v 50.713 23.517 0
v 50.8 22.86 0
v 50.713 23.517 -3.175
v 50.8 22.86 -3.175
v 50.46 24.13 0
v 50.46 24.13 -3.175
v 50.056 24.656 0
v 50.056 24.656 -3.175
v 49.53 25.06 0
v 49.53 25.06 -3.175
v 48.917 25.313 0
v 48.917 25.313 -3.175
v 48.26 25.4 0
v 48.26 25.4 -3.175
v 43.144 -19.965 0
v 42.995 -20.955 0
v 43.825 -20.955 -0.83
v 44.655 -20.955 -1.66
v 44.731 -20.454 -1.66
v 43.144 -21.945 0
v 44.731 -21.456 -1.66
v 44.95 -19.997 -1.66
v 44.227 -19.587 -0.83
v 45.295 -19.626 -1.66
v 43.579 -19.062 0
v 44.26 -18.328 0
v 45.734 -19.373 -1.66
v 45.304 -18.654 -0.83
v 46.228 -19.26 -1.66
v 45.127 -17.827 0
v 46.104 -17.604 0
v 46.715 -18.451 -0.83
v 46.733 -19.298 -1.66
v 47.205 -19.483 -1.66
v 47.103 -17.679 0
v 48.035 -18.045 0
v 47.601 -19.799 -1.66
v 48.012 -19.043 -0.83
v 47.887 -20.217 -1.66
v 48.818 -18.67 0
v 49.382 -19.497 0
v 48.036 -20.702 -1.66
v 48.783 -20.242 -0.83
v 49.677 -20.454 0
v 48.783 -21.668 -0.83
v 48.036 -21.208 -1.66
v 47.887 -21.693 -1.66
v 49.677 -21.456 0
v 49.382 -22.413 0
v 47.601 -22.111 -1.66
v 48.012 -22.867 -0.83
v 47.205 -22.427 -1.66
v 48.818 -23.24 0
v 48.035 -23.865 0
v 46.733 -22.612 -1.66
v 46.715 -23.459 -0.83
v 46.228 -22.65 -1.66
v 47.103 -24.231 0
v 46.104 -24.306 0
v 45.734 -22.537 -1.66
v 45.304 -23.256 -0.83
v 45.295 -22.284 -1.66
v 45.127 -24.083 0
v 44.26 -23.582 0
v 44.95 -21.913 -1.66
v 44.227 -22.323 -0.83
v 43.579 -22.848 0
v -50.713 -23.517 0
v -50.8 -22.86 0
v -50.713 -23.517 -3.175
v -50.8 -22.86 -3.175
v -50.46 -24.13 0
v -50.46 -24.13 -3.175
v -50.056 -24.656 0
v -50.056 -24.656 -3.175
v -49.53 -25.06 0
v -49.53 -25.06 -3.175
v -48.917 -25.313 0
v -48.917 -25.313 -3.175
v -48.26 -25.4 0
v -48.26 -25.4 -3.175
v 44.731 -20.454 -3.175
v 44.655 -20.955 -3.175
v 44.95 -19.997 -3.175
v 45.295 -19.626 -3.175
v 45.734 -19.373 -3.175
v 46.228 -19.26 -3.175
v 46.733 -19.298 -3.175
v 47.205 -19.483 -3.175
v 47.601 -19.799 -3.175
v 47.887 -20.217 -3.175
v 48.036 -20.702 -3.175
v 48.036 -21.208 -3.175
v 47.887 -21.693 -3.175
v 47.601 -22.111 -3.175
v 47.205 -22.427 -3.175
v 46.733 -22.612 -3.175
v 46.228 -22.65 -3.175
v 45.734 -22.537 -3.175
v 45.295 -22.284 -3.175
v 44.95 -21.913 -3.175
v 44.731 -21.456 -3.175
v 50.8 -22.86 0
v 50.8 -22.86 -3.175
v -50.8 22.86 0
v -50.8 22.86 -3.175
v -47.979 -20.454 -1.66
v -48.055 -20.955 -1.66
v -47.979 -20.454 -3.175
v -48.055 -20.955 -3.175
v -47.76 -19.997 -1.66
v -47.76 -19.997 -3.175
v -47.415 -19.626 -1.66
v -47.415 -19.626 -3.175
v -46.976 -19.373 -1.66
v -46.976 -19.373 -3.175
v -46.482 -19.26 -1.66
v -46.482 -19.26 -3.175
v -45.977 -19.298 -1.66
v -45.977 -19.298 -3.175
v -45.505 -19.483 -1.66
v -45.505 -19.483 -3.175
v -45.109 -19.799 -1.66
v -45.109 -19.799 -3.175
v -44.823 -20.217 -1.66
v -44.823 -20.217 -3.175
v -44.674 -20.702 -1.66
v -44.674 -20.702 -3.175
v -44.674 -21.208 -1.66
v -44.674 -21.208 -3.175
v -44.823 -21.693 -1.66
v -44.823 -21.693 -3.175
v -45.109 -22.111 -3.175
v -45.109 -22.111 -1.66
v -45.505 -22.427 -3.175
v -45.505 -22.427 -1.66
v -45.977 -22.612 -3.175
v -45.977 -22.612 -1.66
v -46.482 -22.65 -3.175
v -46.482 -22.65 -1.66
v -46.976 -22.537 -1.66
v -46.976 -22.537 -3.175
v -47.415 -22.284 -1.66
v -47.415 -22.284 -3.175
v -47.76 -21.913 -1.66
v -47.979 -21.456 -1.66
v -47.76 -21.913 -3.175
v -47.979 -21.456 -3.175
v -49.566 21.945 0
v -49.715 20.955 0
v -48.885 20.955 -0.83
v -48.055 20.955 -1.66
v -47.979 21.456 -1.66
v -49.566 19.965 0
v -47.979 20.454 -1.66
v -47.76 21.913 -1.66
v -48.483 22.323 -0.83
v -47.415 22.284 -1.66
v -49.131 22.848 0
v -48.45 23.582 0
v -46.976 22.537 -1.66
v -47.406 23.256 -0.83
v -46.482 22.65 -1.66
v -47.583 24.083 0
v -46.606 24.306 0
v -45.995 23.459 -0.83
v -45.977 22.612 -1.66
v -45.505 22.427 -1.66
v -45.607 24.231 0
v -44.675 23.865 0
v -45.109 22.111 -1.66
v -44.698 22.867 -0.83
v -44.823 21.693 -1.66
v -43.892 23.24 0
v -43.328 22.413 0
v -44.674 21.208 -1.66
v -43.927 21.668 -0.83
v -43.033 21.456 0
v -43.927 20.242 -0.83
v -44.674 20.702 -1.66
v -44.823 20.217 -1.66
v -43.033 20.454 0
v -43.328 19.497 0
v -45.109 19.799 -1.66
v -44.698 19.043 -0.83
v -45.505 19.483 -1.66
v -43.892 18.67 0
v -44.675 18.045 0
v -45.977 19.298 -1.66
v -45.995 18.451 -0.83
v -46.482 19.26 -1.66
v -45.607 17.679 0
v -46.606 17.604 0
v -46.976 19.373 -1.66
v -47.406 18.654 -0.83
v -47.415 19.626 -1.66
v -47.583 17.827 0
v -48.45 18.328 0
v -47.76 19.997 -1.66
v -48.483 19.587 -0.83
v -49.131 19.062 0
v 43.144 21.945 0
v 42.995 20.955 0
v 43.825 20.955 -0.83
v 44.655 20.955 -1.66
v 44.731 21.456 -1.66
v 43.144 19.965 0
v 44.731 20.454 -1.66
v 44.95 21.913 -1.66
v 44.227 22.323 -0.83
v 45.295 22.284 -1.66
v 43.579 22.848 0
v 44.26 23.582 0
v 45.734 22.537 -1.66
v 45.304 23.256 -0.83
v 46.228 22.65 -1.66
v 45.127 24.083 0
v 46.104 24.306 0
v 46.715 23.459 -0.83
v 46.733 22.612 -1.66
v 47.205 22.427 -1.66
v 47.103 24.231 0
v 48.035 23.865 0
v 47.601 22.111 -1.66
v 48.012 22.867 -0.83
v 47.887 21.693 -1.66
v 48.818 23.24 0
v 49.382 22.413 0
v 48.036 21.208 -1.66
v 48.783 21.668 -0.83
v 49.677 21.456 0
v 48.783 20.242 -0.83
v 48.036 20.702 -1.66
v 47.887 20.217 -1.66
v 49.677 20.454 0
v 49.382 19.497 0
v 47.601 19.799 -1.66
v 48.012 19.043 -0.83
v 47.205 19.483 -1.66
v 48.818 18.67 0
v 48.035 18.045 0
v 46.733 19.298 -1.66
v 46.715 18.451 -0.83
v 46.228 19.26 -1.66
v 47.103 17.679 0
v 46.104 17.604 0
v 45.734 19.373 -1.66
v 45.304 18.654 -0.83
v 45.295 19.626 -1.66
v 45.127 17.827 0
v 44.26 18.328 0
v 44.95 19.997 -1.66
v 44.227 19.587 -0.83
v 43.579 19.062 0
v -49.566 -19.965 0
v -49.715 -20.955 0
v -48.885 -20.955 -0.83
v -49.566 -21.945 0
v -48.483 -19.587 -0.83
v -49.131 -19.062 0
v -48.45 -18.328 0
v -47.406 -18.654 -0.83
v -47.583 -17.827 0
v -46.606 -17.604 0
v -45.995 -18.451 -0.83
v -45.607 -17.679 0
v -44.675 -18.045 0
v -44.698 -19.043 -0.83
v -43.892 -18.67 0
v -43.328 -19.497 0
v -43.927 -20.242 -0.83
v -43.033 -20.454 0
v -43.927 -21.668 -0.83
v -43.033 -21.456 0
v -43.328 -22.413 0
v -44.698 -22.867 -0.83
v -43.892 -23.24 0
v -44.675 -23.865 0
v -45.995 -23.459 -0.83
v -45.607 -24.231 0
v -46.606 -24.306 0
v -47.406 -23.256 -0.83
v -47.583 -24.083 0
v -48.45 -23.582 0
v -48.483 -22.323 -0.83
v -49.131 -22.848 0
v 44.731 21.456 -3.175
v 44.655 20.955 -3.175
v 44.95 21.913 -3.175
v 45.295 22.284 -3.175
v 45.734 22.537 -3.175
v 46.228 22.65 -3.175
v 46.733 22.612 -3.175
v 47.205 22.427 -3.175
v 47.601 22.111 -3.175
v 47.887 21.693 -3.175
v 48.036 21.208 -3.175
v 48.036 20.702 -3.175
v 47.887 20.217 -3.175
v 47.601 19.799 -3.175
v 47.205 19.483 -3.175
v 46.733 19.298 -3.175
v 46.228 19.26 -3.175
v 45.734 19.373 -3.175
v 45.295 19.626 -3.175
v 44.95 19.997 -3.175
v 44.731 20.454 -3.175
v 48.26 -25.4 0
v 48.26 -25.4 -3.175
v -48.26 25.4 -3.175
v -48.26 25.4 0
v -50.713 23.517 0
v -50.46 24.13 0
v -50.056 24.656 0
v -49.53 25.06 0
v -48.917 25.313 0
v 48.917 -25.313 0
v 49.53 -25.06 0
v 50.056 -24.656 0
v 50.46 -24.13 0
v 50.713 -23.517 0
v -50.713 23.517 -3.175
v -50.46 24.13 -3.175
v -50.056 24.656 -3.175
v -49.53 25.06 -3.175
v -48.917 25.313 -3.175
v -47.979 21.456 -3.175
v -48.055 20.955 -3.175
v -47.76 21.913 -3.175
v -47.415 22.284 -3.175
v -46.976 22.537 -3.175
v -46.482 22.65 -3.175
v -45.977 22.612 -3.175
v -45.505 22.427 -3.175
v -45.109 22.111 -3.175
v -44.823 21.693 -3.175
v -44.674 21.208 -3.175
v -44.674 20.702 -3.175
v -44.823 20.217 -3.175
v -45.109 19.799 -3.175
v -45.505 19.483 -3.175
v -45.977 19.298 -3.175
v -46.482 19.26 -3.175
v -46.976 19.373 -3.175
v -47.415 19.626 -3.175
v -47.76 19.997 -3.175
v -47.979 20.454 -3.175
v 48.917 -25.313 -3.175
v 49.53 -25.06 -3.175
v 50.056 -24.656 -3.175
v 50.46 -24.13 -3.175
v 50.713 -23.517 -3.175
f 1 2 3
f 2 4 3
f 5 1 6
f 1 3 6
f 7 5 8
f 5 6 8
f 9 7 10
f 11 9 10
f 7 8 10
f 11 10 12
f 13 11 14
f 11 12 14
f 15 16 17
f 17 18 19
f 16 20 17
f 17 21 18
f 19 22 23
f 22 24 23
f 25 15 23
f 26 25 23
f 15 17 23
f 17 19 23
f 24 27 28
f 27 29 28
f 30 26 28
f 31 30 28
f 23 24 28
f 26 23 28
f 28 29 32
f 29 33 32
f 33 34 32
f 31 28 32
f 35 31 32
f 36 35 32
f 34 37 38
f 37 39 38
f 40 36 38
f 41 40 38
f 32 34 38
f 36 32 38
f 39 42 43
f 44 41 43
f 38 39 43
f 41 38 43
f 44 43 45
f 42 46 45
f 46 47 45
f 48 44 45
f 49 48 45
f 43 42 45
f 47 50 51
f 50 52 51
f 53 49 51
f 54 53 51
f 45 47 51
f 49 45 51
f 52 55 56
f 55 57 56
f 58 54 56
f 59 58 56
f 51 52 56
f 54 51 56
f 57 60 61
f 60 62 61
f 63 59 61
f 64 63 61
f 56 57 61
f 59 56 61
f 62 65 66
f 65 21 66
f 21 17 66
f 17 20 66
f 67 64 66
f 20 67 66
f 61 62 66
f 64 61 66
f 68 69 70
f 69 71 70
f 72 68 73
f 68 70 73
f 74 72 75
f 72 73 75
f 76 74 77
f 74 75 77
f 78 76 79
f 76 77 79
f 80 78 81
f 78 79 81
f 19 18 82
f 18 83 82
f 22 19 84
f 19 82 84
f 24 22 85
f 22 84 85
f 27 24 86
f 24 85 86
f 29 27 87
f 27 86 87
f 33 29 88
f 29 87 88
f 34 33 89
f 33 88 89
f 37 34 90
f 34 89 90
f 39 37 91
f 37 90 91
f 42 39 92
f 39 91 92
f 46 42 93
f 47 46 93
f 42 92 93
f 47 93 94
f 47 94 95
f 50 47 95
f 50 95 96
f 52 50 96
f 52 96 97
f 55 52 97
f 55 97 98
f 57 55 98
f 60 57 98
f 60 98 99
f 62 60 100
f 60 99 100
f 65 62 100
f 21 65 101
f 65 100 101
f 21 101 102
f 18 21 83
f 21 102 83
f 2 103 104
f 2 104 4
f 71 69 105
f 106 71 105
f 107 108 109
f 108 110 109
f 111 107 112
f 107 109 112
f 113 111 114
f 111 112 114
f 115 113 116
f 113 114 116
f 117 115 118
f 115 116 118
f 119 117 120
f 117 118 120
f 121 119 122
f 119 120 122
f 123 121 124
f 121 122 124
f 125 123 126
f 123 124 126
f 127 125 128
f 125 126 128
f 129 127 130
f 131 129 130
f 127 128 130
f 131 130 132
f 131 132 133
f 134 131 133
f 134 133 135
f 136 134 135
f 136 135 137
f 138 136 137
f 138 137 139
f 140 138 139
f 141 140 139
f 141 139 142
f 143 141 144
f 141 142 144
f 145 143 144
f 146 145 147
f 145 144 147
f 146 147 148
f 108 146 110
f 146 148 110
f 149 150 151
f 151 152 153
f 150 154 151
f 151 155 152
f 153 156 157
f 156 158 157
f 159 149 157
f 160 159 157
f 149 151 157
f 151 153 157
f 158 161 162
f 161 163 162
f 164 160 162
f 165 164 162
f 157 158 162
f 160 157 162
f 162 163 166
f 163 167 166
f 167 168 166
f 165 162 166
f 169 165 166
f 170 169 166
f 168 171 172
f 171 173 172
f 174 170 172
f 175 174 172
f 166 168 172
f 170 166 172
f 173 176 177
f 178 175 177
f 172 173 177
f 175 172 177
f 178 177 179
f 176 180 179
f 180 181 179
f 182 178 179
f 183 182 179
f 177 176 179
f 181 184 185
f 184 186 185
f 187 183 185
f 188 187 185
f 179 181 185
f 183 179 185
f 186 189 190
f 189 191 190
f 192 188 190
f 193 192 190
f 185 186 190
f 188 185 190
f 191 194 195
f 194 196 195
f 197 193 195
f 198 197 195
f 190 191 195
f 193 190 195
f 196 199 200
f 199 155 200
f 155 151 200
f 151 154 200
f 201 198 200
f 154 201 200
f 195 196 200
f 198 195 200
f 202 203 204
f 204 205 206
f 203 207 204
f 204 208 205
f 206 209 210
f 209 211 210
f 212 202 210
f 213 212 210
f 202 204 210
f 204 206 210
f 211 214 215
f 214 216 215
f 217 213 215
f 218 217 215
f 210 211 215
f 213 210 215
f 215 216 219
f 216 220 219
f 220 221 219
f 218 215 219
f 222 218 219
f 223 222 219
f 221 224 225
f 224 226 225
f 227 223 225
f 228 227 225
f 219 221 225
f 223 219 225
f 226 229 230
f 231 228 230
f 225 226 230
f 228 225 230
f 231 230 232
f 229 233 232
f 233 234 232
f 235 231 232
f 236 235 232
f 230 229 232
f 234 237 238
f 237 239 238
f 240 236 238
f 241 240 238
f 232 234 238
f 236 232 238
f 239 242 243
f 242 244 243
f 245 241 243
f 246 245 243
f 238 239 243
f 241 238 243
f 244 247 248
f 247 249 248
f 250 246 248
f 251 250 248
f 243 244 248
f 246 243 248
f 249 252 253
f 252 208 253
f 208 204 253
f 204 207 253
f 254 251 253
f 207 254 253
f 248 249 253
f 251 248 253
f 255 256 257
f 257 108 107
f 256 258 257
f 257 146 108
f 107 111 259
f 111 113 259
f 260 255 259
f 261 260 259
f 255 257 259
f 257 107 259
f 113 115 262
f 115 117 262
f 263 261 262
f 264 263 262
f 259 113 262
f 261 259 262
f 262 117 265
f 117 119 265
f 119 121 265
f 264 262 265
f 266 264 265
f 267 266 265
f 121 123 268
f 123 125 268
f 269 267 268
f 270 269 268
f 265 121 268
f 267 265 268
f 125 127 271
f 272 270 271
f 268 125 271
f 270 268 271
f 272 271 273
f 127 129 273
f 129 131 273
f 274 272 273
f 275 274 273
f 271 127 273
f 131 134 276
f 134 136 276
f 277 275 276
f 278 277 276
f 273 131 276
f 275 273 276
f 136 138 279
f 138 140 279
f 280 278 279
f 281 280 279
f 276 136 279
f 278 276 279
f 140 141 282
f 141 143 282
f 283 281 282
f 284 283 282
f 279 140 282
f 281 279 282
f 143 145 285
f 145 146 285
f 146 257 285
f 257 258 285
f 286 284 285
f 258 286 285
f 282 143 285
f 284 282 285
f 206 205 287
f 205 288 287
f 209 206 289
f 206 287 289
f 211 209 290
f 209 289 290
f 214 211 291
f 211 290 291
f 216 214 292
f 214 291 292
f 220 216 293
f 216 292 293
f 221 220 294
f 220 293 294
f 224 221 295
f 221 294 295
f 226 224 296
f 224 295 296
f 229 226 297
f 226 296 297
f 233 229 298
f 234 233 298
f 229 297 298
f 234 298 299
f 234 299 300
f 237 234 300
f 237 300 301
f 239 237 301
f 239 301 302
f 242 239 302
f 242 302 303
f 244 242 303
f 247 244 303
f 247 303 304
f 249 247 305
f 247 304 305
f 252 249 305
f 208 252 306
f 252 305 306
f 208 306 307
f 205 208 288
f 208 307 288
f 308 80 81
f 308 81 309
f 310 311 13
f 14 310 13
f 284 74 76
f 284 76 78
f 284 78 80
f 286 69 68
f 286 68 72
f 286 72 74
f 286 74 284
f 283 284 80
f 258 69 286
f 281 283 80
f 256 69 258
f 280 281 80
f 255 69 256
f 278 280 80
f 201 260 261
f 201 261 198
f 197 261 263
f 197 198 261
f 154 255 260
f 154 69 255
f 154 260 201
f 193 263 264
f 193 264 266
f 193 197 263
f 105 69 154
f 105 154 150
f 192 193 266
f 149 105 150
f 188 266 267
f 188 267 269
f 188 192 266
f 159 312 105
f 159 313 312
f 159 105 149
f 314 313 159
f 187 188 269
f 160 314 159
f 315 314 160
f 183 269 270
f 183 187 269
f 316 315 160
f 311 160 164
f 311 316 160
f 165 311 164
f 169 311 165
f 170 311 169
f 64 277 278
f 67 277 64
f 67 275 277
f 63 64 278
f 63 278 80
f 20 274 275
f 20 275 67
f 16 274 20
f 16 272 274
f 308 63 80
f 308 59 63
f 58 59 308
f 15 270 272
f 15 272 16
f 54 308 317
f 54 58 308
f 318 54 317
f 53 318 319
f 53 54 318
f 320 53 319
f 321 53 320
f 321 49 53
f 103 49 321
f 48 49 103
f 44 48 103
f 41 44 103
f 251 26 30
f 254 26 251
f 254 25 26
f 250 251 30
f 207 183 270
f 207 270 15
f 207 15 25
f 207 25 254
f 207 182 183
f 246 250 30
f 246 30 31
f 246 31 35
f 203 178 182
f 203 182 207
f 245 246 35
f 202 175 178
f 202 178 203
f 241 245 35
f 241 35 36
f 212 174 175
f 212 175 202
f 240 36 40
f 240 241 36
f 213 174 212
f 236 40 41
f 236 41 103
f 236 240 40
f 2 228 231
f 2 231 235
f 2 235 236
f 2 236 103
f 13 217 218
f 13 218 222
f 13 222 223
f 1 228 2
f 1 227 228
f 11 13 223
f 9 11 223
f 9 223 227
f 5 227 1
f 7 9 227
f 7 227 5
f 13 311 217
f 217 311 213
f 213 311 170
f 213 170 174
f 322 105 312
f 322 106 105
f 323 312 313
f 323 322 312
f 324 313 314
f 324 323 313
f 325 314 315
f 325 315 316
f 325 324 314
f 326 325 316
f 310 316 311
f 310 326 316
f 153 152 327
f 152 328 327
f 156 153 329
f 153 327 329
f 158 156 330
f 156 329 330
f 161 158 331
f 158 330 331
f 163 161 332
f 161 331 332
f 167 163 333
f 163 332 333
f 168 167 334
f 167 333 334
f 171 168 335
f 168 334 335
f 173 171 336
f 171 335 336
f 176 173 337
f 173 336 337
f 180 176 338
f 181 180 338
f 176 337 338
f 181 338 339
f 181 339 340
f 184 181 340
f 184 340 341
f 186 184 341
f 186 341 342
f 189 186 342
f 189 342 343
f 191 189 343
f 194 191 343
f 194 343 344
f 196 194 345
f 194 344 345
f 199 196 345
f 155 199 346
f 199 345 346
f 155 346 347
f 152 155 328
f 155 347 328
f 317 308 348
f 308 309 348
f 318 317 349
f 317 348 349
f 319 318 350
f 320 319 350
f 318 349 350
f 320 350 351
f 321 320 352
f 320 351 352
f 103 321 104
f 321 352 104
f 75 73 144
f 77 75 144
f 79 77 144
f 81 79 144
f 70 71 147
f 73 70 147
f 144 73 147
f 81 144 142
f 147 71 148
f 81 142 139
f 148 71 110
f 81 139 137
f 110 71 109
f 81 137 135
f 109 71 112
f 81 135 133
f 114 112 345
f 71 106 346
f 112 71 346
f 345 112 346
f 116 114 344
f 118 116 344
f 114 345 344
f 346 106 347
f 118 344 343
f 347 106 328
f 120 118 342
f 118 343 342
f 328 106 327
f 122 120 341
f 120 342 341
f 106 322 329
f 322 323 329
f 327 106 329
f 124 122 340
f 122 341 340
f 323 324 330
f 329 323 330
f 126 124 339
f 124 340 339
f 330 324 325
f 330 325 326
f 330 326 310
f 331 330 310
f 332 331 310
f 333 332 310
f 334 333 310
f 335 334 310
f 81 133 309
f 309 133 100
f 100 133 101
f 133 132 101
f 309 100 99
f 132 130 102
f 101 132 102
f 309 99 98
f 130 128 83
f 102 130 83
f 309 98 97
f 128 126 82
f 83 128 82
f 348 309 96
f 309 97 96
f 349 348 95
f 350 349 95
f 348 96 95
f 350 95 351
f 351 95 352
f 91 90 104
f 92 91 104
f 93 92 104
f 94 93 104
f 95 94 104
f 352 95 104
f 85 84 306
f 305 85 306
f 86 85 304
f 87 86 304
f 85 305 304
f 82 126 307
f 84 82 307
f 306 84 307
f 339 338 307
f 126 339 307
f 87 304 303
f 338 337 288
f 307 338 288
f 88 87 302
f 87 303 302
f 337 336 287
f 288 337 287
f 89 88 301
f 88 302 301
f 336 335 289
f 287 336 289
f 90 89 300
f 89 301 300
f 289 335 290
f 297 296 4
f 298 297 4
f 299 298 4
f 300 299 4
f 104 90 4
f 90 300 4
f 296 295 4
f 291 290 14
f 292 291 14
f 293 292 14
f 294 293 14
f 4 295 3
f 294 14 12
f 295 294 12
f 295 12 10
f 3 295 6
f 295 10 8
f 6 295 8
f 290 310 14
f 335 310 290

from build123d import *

# Parameters (mm, degrees)
F0_W           = 101.6
F0_H           = 50.8
F1_DEPTH       = 3.175
F2_R           = 2.54
F4_D           = 3.4
F4_CSINK_D     = 6.72
F4_CSINK_ANGLE = 90


with BuildPart() as f1:
    # F0 (on Top) → F1 (new body)
    with BuildSketch(Plane.XY):
        Rectangle(F0_W, F0_H)
    extrude(amount=-F1_DEPTH)

    # F2
    f2_edges = [f1.edges().sort_by_distance(p)[0] for p in [
        (-50.8, -25.4, -1.5875),
        (50.8, -25.4, -1.5875),
        (50.8, 25.4, -1.5875),
        (-50.8, 25.4, -1.5875),
    ]]
    fillet(f2_edges, radius=F2_R)

    # F4 (through all)
    with Locations(Plane.XY):
        with Locations((-46.355, 20.955), (46.355, 20.955), (46.355, -20.955), (-46.355, -20.955)):
            CounterSinkHole(F4_D / 2, F4_CSINK_D / 2, counter_sink_angle=F4_CSINK_ANGLE)


solid = f1.part
